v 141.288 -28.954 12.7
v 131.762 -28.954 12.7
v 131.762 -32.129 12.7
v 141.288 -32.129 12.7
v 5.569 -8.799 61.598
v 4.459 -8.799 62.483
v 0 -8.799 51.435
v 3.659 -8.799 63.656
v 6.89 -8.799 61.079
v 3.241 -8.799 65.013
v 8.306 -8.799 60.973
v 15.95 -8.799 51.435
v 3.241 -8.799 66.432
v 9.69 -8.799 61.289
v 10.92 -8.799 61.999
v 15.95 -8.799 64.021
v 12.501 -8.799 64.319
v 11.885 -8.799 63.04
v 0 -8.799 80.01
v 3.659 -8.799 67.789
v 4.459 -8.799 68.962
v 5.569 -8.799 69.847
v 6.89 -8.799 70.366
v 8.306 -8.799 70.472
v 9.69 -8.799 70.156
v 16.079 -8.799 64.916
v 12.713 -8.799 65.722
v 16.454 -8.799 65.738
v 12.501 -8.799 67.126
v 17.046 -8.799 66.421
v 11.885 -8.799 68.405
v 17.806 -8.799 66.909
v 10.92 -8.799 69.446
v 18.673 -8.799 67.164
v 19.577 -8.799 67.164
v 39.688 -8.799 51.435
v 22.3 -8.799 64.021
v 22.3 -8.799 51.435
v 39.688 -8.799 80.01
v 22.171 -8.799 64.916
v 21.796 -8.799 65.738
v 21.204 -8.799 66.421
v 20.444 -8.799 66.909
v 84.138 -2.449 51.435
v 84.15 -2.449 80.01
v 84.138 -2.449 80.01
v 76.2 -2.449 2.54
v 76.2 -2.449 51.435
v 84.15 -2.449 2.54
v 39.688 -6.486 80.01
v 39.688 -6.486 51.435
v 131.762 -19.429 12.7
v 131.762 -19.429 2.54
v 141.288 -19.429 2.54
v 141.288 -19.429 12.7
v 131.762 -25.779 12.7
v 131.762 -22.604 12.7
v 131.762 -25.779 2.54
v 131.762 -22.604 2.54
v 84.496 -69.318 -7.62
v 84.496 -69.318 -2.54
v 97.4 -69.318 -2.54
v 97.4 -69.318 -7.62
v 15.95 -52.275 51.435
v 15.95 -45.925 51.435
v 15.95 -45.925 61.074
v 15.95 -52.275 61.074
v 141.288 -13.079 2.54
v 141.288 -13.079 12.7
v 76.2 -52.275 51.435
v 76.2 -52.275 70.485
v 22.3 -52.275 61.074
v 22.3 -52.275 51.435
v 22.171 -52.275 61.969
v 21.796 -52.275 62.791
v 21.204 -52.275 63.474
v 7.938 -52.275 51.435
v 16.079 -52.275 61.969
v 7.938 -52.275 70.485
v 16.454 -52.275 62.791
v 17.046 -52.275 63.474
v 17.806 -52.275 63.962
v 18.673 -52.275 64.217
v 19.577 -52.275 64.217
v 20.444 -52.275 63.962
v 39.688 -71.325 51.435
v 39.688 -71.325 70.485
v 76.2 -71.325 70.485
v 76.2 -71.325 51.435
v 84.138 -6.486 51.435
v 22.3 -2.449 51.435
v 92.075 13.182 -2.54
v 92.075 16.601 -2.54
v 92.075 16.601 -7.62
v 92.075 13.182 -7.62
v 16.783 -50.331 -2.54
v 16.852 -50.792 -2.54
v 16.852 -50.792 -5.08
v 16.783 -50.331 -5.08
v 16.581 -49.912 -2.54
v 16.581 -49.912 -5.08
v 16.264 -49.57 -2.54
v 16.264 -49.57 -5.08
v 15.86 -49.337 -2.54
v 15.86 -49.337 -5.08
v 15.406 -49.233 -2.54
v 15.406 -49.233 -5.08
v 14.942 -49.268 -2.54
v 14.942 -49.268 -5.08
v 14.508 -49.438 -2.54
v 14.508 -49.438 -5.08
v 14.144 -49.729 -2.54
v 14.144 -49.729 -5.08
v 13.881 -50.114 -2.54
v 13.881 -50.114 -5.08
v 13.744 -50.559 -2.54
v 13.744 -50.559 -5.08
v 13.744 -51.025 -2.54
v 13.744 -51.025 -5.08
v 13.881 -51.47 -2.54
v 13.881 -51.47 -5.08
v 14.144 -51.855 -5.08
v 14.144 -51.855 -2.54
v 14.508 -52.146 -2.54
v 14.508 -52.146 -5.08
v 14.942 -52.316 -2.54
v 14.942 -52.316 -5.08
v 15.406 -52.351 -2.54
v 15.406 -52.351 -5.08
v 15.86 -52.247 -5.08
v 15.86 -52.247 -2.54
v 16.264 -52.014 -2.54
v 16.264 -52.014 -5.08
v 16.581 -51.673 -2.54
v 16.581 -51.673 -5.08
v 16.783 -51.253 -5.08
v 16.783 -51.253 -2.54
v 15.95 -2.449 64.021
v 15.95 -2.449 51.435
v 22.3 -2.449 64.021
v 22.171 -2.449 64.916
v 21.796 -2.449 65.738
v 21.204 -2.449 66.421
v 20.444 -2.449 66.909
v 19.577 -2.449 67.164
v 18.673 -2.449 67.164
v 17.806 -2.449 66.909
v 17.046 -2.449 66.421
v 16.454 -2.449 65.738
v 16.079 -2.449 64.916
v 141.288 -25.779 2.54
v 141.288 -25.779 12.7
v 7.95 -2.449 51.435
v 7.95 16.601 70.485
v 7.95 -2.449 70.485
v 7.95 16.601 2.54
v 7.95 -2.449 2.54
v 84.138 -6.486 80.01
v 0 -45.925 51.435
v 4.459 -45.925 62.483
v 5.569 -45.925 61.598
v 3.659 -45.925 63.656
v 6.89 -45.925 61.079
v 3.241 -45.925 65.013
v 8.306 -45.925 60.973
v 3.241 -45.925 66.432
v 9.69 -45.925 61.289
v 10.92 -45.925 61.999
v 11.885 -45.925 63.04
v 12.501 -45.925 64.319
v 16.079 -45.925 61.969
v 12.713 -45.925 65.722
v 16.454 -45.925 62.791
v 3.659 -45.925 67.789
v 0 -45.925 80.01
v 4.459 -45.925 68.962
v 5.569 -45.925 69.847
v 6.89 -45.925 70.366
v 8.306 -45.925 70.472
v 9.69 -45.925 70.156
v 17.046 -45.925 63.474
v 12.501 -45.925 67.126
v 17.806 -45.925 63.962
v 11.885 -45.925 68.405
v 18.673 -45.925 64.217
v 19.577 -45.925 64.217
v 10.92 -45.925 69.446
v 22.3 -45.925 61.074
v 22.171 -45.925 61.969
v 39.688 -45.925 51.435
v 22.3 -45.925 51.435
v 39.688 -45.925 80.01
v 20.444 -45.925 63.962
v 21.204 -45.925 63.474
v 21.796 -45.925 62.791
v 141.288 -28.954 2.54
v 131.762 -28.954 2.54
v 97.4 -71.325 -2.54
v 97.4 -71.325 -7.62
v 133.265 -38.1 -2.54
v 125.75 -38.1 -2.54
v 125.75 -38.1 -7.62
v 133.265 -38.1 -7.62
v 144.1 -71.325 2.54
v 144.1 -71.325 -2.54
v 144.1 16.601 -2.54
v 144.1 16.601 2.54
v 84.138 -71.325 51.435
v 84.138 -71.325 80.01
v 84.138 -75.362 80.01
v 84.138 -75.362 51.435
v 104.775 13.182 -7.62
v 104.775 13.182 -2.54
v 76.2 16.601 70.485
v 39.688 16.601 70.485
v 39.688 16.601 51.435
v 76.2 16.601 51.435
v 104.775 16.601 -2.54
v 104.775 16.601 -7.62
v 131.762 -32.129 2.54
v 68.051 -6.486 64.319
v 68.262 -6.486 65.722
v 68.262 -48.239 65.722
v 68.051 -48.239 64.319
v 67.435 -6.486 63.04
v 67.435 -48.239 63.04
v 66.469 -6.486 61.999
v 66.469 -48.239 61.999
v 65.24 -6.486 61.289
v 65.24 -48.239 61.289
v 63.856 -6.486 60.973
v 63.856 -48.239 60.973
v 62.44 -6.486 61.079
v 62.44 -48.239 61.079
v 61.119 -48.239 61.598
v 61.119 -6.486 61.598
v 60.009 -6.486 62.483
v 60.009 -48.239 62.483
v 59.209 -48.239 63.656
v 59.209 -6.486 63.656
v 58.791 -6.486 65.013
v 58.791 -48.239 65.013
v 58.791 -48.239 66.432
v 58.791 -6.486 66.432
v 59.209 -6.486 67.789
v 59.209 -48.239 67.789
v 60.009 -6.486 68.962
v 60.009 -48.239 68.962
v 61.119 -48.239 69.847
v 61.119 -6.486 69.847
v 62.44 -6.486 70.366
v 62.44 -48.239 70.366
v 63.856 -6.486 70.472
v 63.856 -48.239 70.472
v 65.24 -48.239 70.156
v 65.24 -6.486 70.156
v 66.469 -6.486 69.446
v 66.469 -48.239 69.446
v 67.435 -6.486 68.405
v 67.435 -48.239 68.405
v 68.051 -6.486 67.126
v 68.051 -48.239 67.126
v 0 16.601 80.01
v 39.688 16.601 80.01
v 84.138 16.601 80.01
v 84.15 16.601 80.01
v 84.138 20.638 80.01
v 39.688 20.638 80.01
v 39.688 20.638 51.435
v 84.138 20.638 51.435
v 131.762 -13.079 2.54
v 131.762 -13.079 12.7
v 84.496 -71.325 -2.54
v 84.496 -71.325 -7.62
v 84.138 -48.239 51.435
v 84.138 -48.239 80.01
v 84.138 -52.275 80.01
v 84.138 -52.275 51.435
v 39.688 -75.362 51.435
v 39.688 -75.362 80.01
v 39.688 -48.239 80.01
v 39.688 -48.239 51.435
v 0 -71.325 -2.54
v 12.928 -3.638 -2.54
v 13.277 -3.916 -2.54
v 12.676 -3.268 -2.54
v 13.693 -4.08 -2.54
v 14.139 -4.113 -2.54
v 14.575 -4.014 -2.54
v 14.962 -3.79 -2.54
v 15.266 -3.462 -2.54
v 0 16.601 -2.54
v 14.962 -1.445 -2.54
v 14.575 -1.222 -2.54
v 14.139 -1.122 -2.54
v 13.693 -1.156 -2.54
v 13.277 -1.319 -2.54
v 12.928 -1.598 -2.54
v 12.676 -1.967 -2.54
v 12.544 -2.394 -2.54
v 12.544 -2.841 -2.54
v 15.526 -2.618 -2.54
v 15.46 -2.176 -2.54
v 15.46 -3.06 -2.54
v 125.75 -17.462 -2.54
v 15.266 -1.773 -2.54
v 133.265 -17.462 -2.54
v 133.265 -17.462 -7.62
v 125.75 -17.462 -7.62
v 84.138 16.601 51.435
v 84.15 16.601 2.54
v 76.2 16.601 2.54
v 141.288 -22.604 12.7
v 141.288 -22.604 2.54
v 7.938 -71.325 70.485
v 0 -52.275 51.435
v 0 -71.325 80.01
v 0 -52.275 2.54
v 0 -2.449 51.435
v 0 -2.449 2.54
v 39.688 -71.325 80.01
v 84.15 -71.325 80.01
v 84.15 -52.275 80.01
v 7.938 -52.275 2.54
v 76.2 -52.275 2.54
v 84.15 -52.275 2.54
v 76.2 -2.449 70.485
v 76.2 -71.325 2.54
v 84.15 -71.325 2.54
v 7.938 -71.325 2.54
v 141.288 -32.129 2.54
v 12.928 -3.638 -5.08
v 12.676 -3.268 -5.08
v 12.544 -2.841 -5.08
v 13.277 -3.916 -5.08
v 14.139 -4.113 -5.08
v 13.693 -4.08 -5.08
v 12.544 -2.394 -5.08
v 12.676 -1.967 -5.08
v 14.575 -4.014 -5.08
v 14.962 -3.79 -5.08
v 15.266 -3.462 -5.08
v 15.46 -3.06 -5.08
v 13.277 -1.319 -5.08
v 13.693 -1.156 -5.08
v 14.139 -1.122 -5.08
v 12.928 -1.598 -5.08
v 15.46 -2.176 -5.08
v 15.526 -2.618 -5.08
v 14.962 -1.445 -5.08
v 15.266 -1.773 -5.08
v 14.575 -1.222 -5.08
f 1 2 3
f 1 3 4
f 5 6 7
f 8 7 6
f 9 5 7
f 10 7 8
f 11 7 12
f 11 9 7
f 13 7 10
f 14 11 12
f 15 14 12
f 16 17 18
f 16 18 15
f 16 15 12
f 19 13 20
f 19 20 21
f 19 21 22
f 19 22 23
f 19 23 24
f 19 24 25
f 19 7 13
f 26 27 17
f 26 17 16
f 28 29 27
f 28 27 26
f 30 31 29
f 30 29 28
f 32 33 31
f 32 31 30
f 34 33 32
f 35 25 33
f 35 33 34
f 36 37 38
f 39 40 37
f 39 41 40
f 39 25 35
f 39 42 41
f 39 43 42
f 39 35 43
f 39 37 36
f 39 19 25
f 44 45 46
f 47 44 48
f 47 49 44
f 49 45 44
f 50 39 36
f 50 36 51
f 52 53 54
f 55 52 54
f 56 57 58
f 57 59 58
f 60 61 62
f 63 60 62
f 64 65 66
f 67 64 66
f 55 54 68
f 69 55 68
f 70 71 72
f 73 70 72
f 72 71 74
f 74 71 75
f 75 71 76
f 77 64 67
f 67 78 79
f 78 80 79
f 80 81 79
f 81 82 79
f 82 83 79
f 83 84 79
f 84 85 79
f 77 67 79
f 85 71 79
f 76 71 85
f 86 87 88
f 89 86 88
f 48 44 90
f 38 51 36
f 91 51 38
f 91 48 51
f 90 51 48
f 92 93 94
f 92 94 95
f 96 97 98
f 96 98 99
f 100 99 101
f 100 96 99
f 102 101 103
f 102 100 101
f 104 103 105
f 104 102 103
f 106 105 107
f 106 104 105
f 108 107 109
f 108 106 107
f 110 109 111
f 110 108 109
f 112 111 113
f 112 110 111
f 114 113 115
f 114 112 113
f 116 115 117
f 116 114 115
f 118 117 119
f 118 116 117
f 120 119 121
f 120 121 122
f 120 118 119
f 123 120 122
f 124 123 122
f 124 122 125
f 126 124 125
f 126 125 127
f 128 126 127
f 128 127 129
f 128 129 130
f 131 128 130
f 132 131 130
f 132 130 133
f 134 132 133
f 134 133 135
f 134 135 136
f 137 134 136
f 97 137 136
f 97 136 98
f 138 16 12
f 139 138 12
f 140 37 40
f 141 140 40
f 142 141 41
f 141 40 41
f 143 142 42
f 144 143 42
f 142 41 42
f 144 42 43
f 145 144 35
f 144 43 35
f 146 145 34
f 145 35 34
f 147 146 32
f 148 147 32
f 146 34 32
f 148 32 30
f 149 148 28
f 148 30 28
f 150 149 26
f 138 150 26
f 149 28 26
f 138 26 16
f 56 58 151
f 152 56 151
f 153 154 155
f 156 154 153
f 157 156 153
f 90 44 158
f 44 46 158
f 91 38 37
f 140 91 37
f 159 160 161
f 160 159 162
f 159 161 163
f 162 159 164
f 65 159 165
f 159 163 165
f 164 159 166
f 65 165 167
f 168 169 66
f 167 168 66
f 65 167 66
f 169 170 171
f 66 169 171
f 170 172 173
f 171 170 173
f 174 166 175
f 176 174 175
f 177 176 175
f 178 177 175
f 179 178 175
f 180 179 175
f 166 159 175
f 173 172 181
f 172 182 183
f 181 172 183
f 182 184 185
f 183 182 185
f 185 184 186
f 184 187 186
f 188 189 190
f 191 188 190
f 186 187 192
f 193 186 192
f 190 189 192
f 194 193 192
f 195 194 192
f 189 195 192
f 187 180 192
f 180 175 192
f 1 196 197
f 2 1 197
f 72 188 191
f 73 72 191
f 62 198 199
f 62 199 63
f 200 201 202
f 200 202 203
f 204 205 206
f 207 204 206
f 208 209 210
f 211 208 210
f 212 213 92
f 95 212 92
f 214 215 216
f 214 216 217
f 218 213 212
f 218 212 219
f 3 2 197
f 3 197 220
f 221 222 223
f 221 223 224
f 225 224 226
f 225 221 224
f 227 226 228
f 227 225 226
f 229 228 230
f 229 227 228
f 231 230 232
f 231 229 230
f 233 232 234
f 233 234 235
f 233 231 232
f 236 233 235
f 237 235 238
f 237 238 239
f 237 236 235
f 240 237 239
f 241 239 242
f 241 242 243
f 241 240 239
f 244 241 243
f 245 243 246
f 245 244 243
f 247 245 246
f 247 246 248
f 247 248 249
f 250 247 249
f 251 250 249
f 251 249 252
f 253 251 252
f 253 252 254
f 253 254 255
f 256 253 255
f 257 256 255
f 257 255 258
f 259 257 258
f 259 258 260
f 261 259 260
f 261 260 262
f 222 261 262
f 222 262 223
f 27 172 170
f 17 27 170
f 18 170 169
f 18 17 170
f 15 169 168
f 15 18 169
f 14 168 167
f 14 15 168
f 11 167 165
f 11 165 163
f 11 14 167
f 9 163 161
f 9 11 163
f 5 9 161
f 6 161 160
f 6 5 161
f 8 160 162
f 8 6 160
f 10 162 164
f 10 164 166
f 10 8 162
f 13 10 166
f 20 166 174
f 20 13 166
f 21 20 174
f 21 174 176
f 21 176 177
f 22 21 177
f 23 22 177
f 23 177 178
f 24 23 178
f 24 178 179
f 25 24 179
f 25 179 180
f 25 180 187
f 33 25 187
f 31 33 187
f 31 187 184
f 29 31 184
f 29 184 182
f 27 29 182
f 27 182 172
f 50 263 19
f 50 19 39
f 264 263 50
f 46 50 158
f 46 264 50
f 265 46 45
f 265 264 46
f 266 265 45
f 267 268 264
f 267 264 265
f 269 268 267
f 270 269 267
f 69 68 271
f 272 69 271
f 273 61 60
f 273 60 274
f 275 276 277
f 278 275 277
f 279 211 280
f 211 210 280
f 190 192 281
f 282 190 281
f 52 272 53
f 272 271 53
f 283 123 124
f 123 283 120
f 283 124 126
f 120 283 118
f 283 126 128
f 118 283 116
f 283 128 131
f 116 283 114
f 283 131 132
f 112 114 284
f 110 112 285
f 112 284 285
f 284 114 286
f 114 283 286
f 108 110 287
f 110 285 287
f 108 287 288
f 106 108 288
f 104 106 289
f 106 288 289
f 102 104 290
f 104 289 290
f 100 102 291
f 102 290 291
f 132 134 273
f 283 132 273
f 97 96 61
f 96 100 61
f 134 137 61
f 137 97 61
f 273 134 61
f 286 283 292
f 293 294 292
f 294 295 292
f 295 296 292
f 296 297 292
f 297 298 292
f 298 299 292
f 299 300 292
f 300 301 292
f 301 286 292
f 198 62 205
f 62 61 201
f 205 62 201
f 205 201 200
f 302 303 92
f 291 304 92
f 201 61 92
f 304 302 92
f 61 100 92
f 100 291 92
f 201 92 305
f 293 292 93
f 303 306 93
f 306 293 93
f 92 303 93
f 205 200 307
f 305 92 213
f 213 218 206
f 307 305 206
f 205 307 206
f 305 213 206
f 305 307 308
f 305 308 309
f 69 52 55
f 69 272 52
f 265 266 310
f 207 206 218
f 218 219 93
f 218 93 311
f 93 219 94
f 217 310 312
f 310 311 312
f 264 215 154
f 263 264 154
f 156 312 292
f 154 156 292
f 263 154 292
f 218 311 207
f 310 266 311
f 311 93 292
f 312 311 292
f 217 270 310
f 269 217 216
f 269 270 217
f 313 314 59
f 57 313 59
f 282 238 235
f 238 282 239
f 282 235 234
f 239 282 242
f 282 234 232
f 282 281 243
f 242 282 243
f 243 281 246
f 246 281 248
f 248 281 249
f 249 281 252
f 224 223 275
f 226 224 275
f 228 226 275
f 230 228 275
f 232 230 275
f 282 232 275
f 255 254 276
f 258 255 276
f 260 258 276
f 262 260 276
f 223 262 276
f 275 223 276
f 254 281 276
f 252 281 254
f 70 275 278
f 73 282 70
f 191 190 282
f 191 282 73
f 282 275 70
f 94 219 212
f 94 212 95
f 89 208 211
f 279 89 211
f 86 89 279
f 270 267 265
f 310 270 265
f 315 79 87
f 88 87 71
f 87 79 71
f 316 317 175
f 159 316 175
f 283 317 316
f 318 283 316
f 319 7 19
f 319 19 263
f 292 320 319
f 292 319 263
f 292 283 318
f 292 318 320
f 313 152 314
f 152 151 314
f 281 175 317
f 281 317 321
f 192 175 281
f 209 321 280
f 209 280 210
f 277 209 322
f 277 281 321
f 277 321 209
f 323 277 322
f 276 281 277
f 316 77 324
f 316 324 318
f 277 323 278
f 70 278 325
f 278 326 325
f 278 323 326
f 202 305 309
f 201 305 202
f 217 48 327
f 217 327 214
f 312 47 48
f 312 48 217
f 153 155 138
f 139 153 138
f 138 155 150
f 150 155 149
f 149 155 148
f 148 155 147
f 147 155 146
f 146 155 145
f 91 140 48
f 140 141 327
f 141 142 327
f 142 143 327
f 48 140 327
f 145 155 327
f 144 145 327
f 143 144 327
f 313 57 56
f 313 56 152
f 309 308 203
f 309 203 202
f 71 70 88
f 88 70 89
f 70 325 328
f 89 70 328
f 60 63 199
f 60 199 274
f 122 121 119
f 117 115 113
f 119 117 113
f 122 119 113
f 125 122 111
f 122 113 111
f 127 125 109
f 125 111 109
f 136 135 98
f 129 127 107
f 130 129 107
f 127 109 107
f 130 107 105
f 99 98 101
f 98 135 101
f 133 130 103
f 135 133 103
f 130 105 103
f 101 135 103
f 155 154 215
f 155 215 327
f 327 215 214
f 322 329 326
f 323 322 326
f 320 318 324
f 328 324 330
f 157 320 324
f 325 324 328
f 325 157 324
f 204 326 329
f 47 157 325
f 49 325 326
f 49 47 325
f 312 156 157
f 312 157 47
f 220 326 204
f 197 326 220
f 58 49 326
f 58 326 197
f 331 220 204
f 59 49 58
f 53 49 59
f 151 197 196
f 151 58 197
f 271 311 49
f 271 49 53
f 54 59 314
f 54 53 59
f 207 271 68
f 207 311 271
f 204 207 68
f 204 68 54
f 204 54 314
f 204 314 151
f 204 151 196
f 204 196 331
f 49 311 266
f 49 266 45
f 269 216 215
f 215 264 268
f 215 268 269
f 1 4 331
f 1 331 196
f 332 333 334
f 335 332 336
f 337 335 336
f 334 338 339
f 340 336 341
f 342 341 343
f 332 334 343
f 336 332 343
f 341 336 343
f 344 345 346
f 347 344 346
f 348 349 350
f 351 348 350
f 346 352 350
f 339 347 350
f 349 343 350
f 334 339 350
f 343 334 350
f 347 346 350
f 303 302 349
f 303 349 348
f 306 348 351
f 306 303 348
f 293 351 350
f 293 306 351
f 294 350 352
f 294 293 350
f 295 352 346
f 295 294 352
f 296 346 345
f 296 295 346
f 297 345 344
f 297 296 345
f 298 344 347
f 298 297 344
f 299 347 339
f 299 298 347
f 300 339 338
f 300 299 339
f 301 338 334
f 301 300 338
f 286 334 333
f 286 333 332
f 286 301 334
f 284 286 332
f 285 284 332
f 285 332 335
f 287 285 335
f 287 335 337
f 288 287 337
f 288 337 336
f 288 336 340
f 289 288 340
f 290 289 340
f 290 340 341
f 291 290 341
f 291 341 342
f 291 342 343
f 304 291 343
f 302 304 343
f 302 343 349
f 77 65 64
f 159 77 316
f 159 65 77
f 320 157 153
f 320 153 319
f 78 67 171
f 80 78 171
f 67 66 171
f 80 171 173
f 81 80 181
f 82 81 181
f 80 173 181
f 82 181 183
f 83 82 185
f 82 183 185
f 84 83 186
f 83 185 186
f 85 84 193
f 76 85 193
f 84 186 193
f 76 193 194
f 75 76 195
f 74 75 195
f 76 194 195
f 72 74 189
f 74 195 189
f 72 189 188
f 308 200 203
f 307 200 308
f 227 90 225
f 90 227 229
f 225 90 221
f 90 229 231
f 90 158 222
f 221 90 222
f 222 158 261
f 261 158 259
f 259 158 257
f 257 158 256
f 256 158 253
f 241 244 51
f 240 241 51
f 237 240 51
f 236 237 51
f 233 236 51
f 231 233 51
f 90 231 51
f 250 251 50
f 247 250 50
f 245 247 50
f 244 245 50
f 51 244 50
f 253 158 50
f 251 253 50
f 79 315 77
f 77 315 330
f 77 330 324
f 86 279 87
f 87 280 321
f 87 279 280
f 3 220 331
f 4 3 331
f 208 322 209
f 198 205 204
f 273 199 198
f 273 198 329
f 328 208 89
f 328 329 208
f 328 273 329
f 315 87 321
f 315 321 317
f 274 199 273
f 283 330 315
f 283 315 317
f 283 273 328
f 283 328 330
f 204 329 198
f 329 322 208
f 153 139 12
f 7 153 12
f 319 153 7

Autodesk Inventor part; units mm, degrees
ref_plane "YZ Plane" through (0, 0, 0) normal (1, 0, 0) x (0, 1, 0)
ref_plane "XZ Plane" through (0, 0, 0) normal (0, 1, 0) x (-1, 0, 0)
ref_plane "XY Plane" through (0, 0, 0) normal (0, 0, 1) x (1, 0, 0)
sketch "Sketch1" plane through (0, 0, 0) normal (0, 0, 1) x (1, 0, 0)
  line L0 (0, -53.3468) -> (0, -11.9835) projected
  line L1 (68.5887, -53.3468) -> (0, -53.3468) projected
  line L2 (68.5887, 0) -> (68.5887, -53.3468) projected
  line L3 (0, 0) -> (68.5887, 0) projected
  line L4 (0, -2.1686) -> (0, 0) projected
  line L5 (0, -11.9835) -> (0, -2.1686) projected
  circle A0 centre (15.2894, -50.7921) radius 1.5631 projected
  circle A1 centre (14.0269, -2.6176) radius 1.4996 projected
  line L6 (0, 0) -> (68.5887, 0)
  line L7 (68.5887, 0) -> (68.5887, -53.3468)
  line L8 (68.5887, -53.3468) -> (0, -53.3468)
  line L9 (0, -53.3468) -> (0, 0)
  circle A2 centre (14.0269, -2.6176) radius 1.4996
  circle A3 centre (15.2894, -50.7921) radius 1.5631
extrude "Extrusion1" add sketch "Sketch1" against normal blind 5.08 contours A0 | A1
ref_plane "Work Plane1" through (0, 0, 0) normal (0, 0, 1) x (1, 0, 0)
sketch "Sketch2" plane through (0, 0, 0) normal (0, 0, 1) x (1, 0, 0)
  line L0 (0, -53.3468) -> (0, -11.9835) projected
  line L1 (68.5887, 0) -> (68.5887, -53.3468) projected
  line L2 (0, -2.1686) -> (0, 0) projected
  line L3 (0, 0) -> (0, -53.3468)
  line L4 (68.5887, -53.3468) -> (68.5887, 0)
  line L5 (68.5887, -71.3254) -> (144.1005, -71.3254)
  line L6 (144.1005, -71.3254) -> (144.1005, 16.6007)
  line L7 (144.1005, 16.6007) -> (68.5887, 16.6007)
  line L8 (68.5887, 16.6007) -> (68.5887, -71.3254)
  line L9 (68.5887, 16.6007) -> (0, 16.6007)
  line L10 (0, 16.6007) -> (0, 0)
  line L11 (68.5887, -71.3254) -> (0, -71.3254)
  line L12 (0, -71.3254) -> (0, -53.3468)
extrude "Extrusion2" add sketch "Sketch2" along normal mid plane 5.08
sketch "Sketch3" plane through (0, 0, -2.54) normal (0, 0, -1) x (-1, 0, 0)
  line L0 (-125.7496, -4.4471) -> (-125.7496, -55.0115) projected
  line L1 (0, -71.3254) -> (-144.1005, -71.3254) projected
  line L2 (-125.7496, -38.1) -> (-133.2651, -38.1)
  line L3 (-133.2651, -38.1) -> (-133.2651, -17.4625)
  line L4 (-133.2651, -17.4625) -> (-125.7496, -17.4625)
  line L5 (-125.7496, -17.4625) -> (-125.7496, -38.1)
  line L6 (-125.7462, 13.1821) -> (-71.1251, 13.1821)
  line L7 (0, 16.6007) -> (-144.1005, 16.6007) projected
  line L8 (-92.075, 13.1821) -> (-104.775, 13.1821)
  line L9 (-104.775, 13.1821) -> (-104.775, 16.6007)
  line L10 (-104.775, 16.6007) -> (-92.075, 16.6007)
  line L11 (-92.075, 16.6007) -> (-92.075, 13.1821)
  line L12 (-80.6496, -69.3179) -> (-97.3996, -69.3179)
  line L13 (-144.1005, -71.3254) -> (0, -71.3254) projected
  line L14 (-97.3996, -69.3179) -> (-84.496, -69.3179)
  line L15 (-84.496, -69.3179) -> (-84.496, -71.3254)
  line L16 (-84.496, -71.3254) -> (-97.3996, -71.3254)
  line L17 (-97.3996, -71.3254) -> (-97.3996, -69.3179)
  point P0 (0, 0)
  point P1 (-68.5887, -71.3254)
  point P2 (-68.5887, 16.6007)
extrude "Extrusion3" add sketch "Sketch3" along normal blind 5.08
sketch "Sketch9" plane through (0, 0, 2.54) normal (0, 0, 1) x (1, 0, 0)
  line L0 (0, -71.3254) -> (7.9375, -71.3254)
  line L1 (7.9375, -71.3254) -> (7.9375, -52.2754)
  line L2 (7.9375, -52.2754) -> (0, -52.2754)
  line L3 (0, -52.2754) -> (0, -71.3254)
  line L4 (0, 16.6007) -> (7.9502, 16.6007)
  line L5 (7.9502, 16.6007) -> (7.9502, -2.4493)
  line L6 (7.9502, -2.4493) -> (0, -2.4493)
  line L7 (0, -2.4493) -> (0, 16.6007)
  line L8 (76.2, -71.3254) -> (84.1502, -71.3254)
  line L9 (84.1502, -71.3254) -> (84.1502, -52.2754)
  line L10 (84.1502, -52.2754) -> (76.2, -52.2754)
  line L11 (76.2, -52.2754) -> (76.2, -71.3254)
  line L12 (76.2, 16.6007) -> (84.1502, 16.6007)
  line L13 (84.1502, 16.6007) -> (84.1502, -2.4493)
  line L14 (84.1502, -2.4493) -> (76.2, -2.4493)
  line L15 (76.2, -2.4493) -> (76.2, 16.6007)
  line L16 (144.1005, 16.6007) -> (0, 16.6007) projected
  line L17 (0, -71.3254) -> (144.1005, -71.3254) projected
  point P0 (0, 0)
  dimension "d19" = 7.9502
  dimension "d20" = 19.05
  dimension "d21" = 7.9502
  dimension "d22" = 19.05
  dimension "d23" = 7.9502
  dimension "d24" = 19.05
  dimension "d41" = 19.05
extrude "Extrusion7" add sketch "Sketch9" along normal blind 67.945
sketch "Sketch10" plane through (0, 0, 2.54) normal (0, 0, 1) x (1, 0, 0)
  line L0 (141.2875, -13.0792) -> (131.7625, -13.0792)
  line L1 (131.7625, -13.0792) -> (131.7625, -19.4292)
  line L2 (131.7625, -19.4292) -> (141.2875, -19.4292)
  line L3 (141.2875, -19.4292) -> (141.2875, -13.0792)
  line L4 (141.2875, -22.6042) -> (131.7625, -22.6042)
  line L5 (131.7625, -22.6042) -> (131.7625, -25.7792)
  line L6 (131.7625, -25.7792) -> (141.2875, -25.7792)
  line L7 (141.2875, -25.7792) -> (141.2875, -22.6042)
  line L8 (141.2875, -28.9542) -> (131.7625, -28.9542)
  line L9 (131.7625, -28.9542) -> (131.7625, -32.1292)
  line L10 (131.7625, -32.1292) -> (141.2875, -32.1292)
  line L11 (141.2875, -32.1292) -> (141.2875, -28.9542)
  line L12 (144.1005, 16.6007) -> (84.1502, 16.6007) projected
  line L13 (84.1502, -71.3254) -> (144.1005, -71.3254) projected
  line L14 (90.4875, -27.3667) -> (109.5375, -27.3667)
  point P0 (0, 0)
  dimension "d30" = 3.175
  dimension "d31" = 3.175
  dimension "d32" = 3.175
  dimension "d33" = 3.175
  dimension "d39" = 6.35
  dimension "d70" = 43.9674
extrude "Extrusion8" add sketch "Sketch10" along normal blind 10.16
sketch "Sketch11" plane through (0, 0, 70.485) normal (0, 0, 1) x (1, 0, 0)
  line L0 (0, 16.6007) -> (84.1502, 16.6007)
  line L1 (84.1502, 16.6007) -> (84.1502, -2.4493)
  line L2 (84.1502, -2.4493) -> (0, -2.4493)
  line L3 (0, -2.4493) -> (0, 16.6007)
  line L4 (0, -71.3254) -> (7.9375, -71.3254) projected
  line L5 (0, -71.3254) -> (84.1502, -71.3254)
  line L6 (84.1502, -71.3254) -> (84.1502, -52.2754)
  line L7 (84.1502, -52.2754) -> (0, -52.2754)
  line L8 (0, -52.2754) -> (0, -71.3254)
  point P0 (0, 0)
  dimension "d44" = 19.05
  dimension "d45" = 19.05
extrude "Extrusion9" add sketch "Sketch11" along normal blind 9.525
sketch "Sketch12" plane through (0, 0, 70.485) normal (0, 0, -1) x (-1, 0, 0)
  line L0 (0, 16.6007) -> (-92.075, 16.6007) projected
  line L1 (-84.1375, 16.6007) -> (-39.6875, 16.6007)
  line L2 (-39.6875, 16.6007) -> (-39.6875, 20.6375)
  line L3 (-39.6875, 20.6375) -> (-84.1375, 20.6375)
  line L4 (-84.1375, 20.6375) -> (-84.1375, 16.6007)
  line L5 (-84.1375, -6.4861) -> (-39.6875, -6.4861)
  line L6 (-39.6875, -6.4861) -> (-39.6875, -2.4493)
  line L7 (-39.6875, -2.4493) -> (-84.1375, -2.4493)
  line L8 (-84.1375, -2.4493) -> (-84.1375, -6.4861)
  line L9 (-84.1375, -52.2754) -> (-39.6875, -52.2754)
  line L10 (-39.6875, -52.2754) -> (-39.6875, -48.2386)
  line L11 (-39.6875, -48.2386) -> (-84.1375, -48.2386)
  line L12 (-84.1375, -48.2386) -> (-84.1375, -52.2754)
  line L13 (-84.1375, -75.3622) -> (-39.6875, -75.3622)
  line L14 (-39.6875, -75.3622) -> (-39.6875, -71.3254)
  line L15 (-39.6875, -71.3254) -> (-84.1375, -71.3254)
  line L16 (-84.1375, -71.3254) -> (-84.1375, -75.3622)
  line L17 (0, -2.4493) -> (-84.1502, -2.4493) projected
  line L18 (-84.1502, -52.2754) -> (0, -52.2754) projected
  line L19 (0, -71.3254) -> (-84.1502, -71.3254) projected
  line L20 (0, -2.4493) -> (0, -52.2754) projected
  line L21 (-39.6875, -52.2754) -> (0, -52.2754)
  line L22 (0, -52.2754) -> (0, -45.9254)
  line L23 (0, -45.9254) -> (-39.6875, -45.9254)
  line L24 (-39.6875, -45.9254) -> (-39.6875, -52.2754)
  line L25 (-39.6875, -2.4493) -> (0, -2.4493)
  line L26 (0, -2.4493) -> (0, -8.7993)
  line L27 (0, -8.7993) -> (-39.6875, -8.7993)
  line L28 (-39.6875, -8.7993) -> (-39.6875, -2.4493)
  point P0 (0, 0)
  dimension "d46" = 4.0368
  dimension "d53" = 44.45
  dimension "d54" = 6.35
  dimension "d55" = 6.35
extrude "Extrusion10" add sketch "Sketch12" along normal blind 19.05 and the other way blind 9.525
sketch "Sketch13" plane through (0, -45.9254, 51.435) normal (0, 1, 0) x (1, 0, 0)
  line L0 (19.1249, 12.586) -> (19.1249, -9.639) construction
  line L1 (15.9499, 12.586) -> (15.9499, -9.639)
  line L2 (22.2999, -9.639) -> (22.2999, 12.586)
  arc A0 (22.2999, 12.586) -> (15.9499, 12.586) centre (19.1249, 12.586) ccw
  arc A1 (15.9499, -9.639) -> (22.2999, -9.639) centre (19.1249, -9.639) ccw
  point P0 (0, 51.435)
  point P1 (19.1249, 1.4735)
extrude "Extrusion11" cut sketch "Sketch13" against normal blind 8.255
sketch "Sketch14" plane through (0, -8.7993, 51.435) normal (0, -1, 0) x (1, 0, 0)
  line L0 (19.1249, 12.586) -> (19.1249, -9.639) construction
  line L1 (15.9499, 12.586) -> (15.9499, -9.639)
  line L2 (22.2999, -9.639) -> (22.2999, 12.586)
  arc A0 (22.2999, 12.586) -> (15.9499, 12.586) centre (19.1249, 12.586) ccw
  arc A1 (15.9499, -9.639) -> (22.2999, -9.639) centre (19.1249, -9.639) ccw
  point P0 (0, 51.435)
  point P1 (19.1249, 1.4735)
extrude "Extrusion12" cut sketch "Sketch14" against normal blind 8.255
sketch "Sketch15" plane through (39.6875, -6.4861, 51.435) normal (0, -1, 0) x (1, 0, 0)
  circle A0 centre (23.8125, 14.2875) radius 4.7625
  line L0 (-31.7373, -48.895) -> (-31.7373, 19.05) projected
  circle A1 centre (-31.7373, 14.2875) radius 4.7625
  point P0 (-39.6875, -51.435)
  dimension "d64" = 9.525
extrude "Extrusion13" add sketch "Sketch15" along normal blind 44.45
properties part number "RC_Chassis"
